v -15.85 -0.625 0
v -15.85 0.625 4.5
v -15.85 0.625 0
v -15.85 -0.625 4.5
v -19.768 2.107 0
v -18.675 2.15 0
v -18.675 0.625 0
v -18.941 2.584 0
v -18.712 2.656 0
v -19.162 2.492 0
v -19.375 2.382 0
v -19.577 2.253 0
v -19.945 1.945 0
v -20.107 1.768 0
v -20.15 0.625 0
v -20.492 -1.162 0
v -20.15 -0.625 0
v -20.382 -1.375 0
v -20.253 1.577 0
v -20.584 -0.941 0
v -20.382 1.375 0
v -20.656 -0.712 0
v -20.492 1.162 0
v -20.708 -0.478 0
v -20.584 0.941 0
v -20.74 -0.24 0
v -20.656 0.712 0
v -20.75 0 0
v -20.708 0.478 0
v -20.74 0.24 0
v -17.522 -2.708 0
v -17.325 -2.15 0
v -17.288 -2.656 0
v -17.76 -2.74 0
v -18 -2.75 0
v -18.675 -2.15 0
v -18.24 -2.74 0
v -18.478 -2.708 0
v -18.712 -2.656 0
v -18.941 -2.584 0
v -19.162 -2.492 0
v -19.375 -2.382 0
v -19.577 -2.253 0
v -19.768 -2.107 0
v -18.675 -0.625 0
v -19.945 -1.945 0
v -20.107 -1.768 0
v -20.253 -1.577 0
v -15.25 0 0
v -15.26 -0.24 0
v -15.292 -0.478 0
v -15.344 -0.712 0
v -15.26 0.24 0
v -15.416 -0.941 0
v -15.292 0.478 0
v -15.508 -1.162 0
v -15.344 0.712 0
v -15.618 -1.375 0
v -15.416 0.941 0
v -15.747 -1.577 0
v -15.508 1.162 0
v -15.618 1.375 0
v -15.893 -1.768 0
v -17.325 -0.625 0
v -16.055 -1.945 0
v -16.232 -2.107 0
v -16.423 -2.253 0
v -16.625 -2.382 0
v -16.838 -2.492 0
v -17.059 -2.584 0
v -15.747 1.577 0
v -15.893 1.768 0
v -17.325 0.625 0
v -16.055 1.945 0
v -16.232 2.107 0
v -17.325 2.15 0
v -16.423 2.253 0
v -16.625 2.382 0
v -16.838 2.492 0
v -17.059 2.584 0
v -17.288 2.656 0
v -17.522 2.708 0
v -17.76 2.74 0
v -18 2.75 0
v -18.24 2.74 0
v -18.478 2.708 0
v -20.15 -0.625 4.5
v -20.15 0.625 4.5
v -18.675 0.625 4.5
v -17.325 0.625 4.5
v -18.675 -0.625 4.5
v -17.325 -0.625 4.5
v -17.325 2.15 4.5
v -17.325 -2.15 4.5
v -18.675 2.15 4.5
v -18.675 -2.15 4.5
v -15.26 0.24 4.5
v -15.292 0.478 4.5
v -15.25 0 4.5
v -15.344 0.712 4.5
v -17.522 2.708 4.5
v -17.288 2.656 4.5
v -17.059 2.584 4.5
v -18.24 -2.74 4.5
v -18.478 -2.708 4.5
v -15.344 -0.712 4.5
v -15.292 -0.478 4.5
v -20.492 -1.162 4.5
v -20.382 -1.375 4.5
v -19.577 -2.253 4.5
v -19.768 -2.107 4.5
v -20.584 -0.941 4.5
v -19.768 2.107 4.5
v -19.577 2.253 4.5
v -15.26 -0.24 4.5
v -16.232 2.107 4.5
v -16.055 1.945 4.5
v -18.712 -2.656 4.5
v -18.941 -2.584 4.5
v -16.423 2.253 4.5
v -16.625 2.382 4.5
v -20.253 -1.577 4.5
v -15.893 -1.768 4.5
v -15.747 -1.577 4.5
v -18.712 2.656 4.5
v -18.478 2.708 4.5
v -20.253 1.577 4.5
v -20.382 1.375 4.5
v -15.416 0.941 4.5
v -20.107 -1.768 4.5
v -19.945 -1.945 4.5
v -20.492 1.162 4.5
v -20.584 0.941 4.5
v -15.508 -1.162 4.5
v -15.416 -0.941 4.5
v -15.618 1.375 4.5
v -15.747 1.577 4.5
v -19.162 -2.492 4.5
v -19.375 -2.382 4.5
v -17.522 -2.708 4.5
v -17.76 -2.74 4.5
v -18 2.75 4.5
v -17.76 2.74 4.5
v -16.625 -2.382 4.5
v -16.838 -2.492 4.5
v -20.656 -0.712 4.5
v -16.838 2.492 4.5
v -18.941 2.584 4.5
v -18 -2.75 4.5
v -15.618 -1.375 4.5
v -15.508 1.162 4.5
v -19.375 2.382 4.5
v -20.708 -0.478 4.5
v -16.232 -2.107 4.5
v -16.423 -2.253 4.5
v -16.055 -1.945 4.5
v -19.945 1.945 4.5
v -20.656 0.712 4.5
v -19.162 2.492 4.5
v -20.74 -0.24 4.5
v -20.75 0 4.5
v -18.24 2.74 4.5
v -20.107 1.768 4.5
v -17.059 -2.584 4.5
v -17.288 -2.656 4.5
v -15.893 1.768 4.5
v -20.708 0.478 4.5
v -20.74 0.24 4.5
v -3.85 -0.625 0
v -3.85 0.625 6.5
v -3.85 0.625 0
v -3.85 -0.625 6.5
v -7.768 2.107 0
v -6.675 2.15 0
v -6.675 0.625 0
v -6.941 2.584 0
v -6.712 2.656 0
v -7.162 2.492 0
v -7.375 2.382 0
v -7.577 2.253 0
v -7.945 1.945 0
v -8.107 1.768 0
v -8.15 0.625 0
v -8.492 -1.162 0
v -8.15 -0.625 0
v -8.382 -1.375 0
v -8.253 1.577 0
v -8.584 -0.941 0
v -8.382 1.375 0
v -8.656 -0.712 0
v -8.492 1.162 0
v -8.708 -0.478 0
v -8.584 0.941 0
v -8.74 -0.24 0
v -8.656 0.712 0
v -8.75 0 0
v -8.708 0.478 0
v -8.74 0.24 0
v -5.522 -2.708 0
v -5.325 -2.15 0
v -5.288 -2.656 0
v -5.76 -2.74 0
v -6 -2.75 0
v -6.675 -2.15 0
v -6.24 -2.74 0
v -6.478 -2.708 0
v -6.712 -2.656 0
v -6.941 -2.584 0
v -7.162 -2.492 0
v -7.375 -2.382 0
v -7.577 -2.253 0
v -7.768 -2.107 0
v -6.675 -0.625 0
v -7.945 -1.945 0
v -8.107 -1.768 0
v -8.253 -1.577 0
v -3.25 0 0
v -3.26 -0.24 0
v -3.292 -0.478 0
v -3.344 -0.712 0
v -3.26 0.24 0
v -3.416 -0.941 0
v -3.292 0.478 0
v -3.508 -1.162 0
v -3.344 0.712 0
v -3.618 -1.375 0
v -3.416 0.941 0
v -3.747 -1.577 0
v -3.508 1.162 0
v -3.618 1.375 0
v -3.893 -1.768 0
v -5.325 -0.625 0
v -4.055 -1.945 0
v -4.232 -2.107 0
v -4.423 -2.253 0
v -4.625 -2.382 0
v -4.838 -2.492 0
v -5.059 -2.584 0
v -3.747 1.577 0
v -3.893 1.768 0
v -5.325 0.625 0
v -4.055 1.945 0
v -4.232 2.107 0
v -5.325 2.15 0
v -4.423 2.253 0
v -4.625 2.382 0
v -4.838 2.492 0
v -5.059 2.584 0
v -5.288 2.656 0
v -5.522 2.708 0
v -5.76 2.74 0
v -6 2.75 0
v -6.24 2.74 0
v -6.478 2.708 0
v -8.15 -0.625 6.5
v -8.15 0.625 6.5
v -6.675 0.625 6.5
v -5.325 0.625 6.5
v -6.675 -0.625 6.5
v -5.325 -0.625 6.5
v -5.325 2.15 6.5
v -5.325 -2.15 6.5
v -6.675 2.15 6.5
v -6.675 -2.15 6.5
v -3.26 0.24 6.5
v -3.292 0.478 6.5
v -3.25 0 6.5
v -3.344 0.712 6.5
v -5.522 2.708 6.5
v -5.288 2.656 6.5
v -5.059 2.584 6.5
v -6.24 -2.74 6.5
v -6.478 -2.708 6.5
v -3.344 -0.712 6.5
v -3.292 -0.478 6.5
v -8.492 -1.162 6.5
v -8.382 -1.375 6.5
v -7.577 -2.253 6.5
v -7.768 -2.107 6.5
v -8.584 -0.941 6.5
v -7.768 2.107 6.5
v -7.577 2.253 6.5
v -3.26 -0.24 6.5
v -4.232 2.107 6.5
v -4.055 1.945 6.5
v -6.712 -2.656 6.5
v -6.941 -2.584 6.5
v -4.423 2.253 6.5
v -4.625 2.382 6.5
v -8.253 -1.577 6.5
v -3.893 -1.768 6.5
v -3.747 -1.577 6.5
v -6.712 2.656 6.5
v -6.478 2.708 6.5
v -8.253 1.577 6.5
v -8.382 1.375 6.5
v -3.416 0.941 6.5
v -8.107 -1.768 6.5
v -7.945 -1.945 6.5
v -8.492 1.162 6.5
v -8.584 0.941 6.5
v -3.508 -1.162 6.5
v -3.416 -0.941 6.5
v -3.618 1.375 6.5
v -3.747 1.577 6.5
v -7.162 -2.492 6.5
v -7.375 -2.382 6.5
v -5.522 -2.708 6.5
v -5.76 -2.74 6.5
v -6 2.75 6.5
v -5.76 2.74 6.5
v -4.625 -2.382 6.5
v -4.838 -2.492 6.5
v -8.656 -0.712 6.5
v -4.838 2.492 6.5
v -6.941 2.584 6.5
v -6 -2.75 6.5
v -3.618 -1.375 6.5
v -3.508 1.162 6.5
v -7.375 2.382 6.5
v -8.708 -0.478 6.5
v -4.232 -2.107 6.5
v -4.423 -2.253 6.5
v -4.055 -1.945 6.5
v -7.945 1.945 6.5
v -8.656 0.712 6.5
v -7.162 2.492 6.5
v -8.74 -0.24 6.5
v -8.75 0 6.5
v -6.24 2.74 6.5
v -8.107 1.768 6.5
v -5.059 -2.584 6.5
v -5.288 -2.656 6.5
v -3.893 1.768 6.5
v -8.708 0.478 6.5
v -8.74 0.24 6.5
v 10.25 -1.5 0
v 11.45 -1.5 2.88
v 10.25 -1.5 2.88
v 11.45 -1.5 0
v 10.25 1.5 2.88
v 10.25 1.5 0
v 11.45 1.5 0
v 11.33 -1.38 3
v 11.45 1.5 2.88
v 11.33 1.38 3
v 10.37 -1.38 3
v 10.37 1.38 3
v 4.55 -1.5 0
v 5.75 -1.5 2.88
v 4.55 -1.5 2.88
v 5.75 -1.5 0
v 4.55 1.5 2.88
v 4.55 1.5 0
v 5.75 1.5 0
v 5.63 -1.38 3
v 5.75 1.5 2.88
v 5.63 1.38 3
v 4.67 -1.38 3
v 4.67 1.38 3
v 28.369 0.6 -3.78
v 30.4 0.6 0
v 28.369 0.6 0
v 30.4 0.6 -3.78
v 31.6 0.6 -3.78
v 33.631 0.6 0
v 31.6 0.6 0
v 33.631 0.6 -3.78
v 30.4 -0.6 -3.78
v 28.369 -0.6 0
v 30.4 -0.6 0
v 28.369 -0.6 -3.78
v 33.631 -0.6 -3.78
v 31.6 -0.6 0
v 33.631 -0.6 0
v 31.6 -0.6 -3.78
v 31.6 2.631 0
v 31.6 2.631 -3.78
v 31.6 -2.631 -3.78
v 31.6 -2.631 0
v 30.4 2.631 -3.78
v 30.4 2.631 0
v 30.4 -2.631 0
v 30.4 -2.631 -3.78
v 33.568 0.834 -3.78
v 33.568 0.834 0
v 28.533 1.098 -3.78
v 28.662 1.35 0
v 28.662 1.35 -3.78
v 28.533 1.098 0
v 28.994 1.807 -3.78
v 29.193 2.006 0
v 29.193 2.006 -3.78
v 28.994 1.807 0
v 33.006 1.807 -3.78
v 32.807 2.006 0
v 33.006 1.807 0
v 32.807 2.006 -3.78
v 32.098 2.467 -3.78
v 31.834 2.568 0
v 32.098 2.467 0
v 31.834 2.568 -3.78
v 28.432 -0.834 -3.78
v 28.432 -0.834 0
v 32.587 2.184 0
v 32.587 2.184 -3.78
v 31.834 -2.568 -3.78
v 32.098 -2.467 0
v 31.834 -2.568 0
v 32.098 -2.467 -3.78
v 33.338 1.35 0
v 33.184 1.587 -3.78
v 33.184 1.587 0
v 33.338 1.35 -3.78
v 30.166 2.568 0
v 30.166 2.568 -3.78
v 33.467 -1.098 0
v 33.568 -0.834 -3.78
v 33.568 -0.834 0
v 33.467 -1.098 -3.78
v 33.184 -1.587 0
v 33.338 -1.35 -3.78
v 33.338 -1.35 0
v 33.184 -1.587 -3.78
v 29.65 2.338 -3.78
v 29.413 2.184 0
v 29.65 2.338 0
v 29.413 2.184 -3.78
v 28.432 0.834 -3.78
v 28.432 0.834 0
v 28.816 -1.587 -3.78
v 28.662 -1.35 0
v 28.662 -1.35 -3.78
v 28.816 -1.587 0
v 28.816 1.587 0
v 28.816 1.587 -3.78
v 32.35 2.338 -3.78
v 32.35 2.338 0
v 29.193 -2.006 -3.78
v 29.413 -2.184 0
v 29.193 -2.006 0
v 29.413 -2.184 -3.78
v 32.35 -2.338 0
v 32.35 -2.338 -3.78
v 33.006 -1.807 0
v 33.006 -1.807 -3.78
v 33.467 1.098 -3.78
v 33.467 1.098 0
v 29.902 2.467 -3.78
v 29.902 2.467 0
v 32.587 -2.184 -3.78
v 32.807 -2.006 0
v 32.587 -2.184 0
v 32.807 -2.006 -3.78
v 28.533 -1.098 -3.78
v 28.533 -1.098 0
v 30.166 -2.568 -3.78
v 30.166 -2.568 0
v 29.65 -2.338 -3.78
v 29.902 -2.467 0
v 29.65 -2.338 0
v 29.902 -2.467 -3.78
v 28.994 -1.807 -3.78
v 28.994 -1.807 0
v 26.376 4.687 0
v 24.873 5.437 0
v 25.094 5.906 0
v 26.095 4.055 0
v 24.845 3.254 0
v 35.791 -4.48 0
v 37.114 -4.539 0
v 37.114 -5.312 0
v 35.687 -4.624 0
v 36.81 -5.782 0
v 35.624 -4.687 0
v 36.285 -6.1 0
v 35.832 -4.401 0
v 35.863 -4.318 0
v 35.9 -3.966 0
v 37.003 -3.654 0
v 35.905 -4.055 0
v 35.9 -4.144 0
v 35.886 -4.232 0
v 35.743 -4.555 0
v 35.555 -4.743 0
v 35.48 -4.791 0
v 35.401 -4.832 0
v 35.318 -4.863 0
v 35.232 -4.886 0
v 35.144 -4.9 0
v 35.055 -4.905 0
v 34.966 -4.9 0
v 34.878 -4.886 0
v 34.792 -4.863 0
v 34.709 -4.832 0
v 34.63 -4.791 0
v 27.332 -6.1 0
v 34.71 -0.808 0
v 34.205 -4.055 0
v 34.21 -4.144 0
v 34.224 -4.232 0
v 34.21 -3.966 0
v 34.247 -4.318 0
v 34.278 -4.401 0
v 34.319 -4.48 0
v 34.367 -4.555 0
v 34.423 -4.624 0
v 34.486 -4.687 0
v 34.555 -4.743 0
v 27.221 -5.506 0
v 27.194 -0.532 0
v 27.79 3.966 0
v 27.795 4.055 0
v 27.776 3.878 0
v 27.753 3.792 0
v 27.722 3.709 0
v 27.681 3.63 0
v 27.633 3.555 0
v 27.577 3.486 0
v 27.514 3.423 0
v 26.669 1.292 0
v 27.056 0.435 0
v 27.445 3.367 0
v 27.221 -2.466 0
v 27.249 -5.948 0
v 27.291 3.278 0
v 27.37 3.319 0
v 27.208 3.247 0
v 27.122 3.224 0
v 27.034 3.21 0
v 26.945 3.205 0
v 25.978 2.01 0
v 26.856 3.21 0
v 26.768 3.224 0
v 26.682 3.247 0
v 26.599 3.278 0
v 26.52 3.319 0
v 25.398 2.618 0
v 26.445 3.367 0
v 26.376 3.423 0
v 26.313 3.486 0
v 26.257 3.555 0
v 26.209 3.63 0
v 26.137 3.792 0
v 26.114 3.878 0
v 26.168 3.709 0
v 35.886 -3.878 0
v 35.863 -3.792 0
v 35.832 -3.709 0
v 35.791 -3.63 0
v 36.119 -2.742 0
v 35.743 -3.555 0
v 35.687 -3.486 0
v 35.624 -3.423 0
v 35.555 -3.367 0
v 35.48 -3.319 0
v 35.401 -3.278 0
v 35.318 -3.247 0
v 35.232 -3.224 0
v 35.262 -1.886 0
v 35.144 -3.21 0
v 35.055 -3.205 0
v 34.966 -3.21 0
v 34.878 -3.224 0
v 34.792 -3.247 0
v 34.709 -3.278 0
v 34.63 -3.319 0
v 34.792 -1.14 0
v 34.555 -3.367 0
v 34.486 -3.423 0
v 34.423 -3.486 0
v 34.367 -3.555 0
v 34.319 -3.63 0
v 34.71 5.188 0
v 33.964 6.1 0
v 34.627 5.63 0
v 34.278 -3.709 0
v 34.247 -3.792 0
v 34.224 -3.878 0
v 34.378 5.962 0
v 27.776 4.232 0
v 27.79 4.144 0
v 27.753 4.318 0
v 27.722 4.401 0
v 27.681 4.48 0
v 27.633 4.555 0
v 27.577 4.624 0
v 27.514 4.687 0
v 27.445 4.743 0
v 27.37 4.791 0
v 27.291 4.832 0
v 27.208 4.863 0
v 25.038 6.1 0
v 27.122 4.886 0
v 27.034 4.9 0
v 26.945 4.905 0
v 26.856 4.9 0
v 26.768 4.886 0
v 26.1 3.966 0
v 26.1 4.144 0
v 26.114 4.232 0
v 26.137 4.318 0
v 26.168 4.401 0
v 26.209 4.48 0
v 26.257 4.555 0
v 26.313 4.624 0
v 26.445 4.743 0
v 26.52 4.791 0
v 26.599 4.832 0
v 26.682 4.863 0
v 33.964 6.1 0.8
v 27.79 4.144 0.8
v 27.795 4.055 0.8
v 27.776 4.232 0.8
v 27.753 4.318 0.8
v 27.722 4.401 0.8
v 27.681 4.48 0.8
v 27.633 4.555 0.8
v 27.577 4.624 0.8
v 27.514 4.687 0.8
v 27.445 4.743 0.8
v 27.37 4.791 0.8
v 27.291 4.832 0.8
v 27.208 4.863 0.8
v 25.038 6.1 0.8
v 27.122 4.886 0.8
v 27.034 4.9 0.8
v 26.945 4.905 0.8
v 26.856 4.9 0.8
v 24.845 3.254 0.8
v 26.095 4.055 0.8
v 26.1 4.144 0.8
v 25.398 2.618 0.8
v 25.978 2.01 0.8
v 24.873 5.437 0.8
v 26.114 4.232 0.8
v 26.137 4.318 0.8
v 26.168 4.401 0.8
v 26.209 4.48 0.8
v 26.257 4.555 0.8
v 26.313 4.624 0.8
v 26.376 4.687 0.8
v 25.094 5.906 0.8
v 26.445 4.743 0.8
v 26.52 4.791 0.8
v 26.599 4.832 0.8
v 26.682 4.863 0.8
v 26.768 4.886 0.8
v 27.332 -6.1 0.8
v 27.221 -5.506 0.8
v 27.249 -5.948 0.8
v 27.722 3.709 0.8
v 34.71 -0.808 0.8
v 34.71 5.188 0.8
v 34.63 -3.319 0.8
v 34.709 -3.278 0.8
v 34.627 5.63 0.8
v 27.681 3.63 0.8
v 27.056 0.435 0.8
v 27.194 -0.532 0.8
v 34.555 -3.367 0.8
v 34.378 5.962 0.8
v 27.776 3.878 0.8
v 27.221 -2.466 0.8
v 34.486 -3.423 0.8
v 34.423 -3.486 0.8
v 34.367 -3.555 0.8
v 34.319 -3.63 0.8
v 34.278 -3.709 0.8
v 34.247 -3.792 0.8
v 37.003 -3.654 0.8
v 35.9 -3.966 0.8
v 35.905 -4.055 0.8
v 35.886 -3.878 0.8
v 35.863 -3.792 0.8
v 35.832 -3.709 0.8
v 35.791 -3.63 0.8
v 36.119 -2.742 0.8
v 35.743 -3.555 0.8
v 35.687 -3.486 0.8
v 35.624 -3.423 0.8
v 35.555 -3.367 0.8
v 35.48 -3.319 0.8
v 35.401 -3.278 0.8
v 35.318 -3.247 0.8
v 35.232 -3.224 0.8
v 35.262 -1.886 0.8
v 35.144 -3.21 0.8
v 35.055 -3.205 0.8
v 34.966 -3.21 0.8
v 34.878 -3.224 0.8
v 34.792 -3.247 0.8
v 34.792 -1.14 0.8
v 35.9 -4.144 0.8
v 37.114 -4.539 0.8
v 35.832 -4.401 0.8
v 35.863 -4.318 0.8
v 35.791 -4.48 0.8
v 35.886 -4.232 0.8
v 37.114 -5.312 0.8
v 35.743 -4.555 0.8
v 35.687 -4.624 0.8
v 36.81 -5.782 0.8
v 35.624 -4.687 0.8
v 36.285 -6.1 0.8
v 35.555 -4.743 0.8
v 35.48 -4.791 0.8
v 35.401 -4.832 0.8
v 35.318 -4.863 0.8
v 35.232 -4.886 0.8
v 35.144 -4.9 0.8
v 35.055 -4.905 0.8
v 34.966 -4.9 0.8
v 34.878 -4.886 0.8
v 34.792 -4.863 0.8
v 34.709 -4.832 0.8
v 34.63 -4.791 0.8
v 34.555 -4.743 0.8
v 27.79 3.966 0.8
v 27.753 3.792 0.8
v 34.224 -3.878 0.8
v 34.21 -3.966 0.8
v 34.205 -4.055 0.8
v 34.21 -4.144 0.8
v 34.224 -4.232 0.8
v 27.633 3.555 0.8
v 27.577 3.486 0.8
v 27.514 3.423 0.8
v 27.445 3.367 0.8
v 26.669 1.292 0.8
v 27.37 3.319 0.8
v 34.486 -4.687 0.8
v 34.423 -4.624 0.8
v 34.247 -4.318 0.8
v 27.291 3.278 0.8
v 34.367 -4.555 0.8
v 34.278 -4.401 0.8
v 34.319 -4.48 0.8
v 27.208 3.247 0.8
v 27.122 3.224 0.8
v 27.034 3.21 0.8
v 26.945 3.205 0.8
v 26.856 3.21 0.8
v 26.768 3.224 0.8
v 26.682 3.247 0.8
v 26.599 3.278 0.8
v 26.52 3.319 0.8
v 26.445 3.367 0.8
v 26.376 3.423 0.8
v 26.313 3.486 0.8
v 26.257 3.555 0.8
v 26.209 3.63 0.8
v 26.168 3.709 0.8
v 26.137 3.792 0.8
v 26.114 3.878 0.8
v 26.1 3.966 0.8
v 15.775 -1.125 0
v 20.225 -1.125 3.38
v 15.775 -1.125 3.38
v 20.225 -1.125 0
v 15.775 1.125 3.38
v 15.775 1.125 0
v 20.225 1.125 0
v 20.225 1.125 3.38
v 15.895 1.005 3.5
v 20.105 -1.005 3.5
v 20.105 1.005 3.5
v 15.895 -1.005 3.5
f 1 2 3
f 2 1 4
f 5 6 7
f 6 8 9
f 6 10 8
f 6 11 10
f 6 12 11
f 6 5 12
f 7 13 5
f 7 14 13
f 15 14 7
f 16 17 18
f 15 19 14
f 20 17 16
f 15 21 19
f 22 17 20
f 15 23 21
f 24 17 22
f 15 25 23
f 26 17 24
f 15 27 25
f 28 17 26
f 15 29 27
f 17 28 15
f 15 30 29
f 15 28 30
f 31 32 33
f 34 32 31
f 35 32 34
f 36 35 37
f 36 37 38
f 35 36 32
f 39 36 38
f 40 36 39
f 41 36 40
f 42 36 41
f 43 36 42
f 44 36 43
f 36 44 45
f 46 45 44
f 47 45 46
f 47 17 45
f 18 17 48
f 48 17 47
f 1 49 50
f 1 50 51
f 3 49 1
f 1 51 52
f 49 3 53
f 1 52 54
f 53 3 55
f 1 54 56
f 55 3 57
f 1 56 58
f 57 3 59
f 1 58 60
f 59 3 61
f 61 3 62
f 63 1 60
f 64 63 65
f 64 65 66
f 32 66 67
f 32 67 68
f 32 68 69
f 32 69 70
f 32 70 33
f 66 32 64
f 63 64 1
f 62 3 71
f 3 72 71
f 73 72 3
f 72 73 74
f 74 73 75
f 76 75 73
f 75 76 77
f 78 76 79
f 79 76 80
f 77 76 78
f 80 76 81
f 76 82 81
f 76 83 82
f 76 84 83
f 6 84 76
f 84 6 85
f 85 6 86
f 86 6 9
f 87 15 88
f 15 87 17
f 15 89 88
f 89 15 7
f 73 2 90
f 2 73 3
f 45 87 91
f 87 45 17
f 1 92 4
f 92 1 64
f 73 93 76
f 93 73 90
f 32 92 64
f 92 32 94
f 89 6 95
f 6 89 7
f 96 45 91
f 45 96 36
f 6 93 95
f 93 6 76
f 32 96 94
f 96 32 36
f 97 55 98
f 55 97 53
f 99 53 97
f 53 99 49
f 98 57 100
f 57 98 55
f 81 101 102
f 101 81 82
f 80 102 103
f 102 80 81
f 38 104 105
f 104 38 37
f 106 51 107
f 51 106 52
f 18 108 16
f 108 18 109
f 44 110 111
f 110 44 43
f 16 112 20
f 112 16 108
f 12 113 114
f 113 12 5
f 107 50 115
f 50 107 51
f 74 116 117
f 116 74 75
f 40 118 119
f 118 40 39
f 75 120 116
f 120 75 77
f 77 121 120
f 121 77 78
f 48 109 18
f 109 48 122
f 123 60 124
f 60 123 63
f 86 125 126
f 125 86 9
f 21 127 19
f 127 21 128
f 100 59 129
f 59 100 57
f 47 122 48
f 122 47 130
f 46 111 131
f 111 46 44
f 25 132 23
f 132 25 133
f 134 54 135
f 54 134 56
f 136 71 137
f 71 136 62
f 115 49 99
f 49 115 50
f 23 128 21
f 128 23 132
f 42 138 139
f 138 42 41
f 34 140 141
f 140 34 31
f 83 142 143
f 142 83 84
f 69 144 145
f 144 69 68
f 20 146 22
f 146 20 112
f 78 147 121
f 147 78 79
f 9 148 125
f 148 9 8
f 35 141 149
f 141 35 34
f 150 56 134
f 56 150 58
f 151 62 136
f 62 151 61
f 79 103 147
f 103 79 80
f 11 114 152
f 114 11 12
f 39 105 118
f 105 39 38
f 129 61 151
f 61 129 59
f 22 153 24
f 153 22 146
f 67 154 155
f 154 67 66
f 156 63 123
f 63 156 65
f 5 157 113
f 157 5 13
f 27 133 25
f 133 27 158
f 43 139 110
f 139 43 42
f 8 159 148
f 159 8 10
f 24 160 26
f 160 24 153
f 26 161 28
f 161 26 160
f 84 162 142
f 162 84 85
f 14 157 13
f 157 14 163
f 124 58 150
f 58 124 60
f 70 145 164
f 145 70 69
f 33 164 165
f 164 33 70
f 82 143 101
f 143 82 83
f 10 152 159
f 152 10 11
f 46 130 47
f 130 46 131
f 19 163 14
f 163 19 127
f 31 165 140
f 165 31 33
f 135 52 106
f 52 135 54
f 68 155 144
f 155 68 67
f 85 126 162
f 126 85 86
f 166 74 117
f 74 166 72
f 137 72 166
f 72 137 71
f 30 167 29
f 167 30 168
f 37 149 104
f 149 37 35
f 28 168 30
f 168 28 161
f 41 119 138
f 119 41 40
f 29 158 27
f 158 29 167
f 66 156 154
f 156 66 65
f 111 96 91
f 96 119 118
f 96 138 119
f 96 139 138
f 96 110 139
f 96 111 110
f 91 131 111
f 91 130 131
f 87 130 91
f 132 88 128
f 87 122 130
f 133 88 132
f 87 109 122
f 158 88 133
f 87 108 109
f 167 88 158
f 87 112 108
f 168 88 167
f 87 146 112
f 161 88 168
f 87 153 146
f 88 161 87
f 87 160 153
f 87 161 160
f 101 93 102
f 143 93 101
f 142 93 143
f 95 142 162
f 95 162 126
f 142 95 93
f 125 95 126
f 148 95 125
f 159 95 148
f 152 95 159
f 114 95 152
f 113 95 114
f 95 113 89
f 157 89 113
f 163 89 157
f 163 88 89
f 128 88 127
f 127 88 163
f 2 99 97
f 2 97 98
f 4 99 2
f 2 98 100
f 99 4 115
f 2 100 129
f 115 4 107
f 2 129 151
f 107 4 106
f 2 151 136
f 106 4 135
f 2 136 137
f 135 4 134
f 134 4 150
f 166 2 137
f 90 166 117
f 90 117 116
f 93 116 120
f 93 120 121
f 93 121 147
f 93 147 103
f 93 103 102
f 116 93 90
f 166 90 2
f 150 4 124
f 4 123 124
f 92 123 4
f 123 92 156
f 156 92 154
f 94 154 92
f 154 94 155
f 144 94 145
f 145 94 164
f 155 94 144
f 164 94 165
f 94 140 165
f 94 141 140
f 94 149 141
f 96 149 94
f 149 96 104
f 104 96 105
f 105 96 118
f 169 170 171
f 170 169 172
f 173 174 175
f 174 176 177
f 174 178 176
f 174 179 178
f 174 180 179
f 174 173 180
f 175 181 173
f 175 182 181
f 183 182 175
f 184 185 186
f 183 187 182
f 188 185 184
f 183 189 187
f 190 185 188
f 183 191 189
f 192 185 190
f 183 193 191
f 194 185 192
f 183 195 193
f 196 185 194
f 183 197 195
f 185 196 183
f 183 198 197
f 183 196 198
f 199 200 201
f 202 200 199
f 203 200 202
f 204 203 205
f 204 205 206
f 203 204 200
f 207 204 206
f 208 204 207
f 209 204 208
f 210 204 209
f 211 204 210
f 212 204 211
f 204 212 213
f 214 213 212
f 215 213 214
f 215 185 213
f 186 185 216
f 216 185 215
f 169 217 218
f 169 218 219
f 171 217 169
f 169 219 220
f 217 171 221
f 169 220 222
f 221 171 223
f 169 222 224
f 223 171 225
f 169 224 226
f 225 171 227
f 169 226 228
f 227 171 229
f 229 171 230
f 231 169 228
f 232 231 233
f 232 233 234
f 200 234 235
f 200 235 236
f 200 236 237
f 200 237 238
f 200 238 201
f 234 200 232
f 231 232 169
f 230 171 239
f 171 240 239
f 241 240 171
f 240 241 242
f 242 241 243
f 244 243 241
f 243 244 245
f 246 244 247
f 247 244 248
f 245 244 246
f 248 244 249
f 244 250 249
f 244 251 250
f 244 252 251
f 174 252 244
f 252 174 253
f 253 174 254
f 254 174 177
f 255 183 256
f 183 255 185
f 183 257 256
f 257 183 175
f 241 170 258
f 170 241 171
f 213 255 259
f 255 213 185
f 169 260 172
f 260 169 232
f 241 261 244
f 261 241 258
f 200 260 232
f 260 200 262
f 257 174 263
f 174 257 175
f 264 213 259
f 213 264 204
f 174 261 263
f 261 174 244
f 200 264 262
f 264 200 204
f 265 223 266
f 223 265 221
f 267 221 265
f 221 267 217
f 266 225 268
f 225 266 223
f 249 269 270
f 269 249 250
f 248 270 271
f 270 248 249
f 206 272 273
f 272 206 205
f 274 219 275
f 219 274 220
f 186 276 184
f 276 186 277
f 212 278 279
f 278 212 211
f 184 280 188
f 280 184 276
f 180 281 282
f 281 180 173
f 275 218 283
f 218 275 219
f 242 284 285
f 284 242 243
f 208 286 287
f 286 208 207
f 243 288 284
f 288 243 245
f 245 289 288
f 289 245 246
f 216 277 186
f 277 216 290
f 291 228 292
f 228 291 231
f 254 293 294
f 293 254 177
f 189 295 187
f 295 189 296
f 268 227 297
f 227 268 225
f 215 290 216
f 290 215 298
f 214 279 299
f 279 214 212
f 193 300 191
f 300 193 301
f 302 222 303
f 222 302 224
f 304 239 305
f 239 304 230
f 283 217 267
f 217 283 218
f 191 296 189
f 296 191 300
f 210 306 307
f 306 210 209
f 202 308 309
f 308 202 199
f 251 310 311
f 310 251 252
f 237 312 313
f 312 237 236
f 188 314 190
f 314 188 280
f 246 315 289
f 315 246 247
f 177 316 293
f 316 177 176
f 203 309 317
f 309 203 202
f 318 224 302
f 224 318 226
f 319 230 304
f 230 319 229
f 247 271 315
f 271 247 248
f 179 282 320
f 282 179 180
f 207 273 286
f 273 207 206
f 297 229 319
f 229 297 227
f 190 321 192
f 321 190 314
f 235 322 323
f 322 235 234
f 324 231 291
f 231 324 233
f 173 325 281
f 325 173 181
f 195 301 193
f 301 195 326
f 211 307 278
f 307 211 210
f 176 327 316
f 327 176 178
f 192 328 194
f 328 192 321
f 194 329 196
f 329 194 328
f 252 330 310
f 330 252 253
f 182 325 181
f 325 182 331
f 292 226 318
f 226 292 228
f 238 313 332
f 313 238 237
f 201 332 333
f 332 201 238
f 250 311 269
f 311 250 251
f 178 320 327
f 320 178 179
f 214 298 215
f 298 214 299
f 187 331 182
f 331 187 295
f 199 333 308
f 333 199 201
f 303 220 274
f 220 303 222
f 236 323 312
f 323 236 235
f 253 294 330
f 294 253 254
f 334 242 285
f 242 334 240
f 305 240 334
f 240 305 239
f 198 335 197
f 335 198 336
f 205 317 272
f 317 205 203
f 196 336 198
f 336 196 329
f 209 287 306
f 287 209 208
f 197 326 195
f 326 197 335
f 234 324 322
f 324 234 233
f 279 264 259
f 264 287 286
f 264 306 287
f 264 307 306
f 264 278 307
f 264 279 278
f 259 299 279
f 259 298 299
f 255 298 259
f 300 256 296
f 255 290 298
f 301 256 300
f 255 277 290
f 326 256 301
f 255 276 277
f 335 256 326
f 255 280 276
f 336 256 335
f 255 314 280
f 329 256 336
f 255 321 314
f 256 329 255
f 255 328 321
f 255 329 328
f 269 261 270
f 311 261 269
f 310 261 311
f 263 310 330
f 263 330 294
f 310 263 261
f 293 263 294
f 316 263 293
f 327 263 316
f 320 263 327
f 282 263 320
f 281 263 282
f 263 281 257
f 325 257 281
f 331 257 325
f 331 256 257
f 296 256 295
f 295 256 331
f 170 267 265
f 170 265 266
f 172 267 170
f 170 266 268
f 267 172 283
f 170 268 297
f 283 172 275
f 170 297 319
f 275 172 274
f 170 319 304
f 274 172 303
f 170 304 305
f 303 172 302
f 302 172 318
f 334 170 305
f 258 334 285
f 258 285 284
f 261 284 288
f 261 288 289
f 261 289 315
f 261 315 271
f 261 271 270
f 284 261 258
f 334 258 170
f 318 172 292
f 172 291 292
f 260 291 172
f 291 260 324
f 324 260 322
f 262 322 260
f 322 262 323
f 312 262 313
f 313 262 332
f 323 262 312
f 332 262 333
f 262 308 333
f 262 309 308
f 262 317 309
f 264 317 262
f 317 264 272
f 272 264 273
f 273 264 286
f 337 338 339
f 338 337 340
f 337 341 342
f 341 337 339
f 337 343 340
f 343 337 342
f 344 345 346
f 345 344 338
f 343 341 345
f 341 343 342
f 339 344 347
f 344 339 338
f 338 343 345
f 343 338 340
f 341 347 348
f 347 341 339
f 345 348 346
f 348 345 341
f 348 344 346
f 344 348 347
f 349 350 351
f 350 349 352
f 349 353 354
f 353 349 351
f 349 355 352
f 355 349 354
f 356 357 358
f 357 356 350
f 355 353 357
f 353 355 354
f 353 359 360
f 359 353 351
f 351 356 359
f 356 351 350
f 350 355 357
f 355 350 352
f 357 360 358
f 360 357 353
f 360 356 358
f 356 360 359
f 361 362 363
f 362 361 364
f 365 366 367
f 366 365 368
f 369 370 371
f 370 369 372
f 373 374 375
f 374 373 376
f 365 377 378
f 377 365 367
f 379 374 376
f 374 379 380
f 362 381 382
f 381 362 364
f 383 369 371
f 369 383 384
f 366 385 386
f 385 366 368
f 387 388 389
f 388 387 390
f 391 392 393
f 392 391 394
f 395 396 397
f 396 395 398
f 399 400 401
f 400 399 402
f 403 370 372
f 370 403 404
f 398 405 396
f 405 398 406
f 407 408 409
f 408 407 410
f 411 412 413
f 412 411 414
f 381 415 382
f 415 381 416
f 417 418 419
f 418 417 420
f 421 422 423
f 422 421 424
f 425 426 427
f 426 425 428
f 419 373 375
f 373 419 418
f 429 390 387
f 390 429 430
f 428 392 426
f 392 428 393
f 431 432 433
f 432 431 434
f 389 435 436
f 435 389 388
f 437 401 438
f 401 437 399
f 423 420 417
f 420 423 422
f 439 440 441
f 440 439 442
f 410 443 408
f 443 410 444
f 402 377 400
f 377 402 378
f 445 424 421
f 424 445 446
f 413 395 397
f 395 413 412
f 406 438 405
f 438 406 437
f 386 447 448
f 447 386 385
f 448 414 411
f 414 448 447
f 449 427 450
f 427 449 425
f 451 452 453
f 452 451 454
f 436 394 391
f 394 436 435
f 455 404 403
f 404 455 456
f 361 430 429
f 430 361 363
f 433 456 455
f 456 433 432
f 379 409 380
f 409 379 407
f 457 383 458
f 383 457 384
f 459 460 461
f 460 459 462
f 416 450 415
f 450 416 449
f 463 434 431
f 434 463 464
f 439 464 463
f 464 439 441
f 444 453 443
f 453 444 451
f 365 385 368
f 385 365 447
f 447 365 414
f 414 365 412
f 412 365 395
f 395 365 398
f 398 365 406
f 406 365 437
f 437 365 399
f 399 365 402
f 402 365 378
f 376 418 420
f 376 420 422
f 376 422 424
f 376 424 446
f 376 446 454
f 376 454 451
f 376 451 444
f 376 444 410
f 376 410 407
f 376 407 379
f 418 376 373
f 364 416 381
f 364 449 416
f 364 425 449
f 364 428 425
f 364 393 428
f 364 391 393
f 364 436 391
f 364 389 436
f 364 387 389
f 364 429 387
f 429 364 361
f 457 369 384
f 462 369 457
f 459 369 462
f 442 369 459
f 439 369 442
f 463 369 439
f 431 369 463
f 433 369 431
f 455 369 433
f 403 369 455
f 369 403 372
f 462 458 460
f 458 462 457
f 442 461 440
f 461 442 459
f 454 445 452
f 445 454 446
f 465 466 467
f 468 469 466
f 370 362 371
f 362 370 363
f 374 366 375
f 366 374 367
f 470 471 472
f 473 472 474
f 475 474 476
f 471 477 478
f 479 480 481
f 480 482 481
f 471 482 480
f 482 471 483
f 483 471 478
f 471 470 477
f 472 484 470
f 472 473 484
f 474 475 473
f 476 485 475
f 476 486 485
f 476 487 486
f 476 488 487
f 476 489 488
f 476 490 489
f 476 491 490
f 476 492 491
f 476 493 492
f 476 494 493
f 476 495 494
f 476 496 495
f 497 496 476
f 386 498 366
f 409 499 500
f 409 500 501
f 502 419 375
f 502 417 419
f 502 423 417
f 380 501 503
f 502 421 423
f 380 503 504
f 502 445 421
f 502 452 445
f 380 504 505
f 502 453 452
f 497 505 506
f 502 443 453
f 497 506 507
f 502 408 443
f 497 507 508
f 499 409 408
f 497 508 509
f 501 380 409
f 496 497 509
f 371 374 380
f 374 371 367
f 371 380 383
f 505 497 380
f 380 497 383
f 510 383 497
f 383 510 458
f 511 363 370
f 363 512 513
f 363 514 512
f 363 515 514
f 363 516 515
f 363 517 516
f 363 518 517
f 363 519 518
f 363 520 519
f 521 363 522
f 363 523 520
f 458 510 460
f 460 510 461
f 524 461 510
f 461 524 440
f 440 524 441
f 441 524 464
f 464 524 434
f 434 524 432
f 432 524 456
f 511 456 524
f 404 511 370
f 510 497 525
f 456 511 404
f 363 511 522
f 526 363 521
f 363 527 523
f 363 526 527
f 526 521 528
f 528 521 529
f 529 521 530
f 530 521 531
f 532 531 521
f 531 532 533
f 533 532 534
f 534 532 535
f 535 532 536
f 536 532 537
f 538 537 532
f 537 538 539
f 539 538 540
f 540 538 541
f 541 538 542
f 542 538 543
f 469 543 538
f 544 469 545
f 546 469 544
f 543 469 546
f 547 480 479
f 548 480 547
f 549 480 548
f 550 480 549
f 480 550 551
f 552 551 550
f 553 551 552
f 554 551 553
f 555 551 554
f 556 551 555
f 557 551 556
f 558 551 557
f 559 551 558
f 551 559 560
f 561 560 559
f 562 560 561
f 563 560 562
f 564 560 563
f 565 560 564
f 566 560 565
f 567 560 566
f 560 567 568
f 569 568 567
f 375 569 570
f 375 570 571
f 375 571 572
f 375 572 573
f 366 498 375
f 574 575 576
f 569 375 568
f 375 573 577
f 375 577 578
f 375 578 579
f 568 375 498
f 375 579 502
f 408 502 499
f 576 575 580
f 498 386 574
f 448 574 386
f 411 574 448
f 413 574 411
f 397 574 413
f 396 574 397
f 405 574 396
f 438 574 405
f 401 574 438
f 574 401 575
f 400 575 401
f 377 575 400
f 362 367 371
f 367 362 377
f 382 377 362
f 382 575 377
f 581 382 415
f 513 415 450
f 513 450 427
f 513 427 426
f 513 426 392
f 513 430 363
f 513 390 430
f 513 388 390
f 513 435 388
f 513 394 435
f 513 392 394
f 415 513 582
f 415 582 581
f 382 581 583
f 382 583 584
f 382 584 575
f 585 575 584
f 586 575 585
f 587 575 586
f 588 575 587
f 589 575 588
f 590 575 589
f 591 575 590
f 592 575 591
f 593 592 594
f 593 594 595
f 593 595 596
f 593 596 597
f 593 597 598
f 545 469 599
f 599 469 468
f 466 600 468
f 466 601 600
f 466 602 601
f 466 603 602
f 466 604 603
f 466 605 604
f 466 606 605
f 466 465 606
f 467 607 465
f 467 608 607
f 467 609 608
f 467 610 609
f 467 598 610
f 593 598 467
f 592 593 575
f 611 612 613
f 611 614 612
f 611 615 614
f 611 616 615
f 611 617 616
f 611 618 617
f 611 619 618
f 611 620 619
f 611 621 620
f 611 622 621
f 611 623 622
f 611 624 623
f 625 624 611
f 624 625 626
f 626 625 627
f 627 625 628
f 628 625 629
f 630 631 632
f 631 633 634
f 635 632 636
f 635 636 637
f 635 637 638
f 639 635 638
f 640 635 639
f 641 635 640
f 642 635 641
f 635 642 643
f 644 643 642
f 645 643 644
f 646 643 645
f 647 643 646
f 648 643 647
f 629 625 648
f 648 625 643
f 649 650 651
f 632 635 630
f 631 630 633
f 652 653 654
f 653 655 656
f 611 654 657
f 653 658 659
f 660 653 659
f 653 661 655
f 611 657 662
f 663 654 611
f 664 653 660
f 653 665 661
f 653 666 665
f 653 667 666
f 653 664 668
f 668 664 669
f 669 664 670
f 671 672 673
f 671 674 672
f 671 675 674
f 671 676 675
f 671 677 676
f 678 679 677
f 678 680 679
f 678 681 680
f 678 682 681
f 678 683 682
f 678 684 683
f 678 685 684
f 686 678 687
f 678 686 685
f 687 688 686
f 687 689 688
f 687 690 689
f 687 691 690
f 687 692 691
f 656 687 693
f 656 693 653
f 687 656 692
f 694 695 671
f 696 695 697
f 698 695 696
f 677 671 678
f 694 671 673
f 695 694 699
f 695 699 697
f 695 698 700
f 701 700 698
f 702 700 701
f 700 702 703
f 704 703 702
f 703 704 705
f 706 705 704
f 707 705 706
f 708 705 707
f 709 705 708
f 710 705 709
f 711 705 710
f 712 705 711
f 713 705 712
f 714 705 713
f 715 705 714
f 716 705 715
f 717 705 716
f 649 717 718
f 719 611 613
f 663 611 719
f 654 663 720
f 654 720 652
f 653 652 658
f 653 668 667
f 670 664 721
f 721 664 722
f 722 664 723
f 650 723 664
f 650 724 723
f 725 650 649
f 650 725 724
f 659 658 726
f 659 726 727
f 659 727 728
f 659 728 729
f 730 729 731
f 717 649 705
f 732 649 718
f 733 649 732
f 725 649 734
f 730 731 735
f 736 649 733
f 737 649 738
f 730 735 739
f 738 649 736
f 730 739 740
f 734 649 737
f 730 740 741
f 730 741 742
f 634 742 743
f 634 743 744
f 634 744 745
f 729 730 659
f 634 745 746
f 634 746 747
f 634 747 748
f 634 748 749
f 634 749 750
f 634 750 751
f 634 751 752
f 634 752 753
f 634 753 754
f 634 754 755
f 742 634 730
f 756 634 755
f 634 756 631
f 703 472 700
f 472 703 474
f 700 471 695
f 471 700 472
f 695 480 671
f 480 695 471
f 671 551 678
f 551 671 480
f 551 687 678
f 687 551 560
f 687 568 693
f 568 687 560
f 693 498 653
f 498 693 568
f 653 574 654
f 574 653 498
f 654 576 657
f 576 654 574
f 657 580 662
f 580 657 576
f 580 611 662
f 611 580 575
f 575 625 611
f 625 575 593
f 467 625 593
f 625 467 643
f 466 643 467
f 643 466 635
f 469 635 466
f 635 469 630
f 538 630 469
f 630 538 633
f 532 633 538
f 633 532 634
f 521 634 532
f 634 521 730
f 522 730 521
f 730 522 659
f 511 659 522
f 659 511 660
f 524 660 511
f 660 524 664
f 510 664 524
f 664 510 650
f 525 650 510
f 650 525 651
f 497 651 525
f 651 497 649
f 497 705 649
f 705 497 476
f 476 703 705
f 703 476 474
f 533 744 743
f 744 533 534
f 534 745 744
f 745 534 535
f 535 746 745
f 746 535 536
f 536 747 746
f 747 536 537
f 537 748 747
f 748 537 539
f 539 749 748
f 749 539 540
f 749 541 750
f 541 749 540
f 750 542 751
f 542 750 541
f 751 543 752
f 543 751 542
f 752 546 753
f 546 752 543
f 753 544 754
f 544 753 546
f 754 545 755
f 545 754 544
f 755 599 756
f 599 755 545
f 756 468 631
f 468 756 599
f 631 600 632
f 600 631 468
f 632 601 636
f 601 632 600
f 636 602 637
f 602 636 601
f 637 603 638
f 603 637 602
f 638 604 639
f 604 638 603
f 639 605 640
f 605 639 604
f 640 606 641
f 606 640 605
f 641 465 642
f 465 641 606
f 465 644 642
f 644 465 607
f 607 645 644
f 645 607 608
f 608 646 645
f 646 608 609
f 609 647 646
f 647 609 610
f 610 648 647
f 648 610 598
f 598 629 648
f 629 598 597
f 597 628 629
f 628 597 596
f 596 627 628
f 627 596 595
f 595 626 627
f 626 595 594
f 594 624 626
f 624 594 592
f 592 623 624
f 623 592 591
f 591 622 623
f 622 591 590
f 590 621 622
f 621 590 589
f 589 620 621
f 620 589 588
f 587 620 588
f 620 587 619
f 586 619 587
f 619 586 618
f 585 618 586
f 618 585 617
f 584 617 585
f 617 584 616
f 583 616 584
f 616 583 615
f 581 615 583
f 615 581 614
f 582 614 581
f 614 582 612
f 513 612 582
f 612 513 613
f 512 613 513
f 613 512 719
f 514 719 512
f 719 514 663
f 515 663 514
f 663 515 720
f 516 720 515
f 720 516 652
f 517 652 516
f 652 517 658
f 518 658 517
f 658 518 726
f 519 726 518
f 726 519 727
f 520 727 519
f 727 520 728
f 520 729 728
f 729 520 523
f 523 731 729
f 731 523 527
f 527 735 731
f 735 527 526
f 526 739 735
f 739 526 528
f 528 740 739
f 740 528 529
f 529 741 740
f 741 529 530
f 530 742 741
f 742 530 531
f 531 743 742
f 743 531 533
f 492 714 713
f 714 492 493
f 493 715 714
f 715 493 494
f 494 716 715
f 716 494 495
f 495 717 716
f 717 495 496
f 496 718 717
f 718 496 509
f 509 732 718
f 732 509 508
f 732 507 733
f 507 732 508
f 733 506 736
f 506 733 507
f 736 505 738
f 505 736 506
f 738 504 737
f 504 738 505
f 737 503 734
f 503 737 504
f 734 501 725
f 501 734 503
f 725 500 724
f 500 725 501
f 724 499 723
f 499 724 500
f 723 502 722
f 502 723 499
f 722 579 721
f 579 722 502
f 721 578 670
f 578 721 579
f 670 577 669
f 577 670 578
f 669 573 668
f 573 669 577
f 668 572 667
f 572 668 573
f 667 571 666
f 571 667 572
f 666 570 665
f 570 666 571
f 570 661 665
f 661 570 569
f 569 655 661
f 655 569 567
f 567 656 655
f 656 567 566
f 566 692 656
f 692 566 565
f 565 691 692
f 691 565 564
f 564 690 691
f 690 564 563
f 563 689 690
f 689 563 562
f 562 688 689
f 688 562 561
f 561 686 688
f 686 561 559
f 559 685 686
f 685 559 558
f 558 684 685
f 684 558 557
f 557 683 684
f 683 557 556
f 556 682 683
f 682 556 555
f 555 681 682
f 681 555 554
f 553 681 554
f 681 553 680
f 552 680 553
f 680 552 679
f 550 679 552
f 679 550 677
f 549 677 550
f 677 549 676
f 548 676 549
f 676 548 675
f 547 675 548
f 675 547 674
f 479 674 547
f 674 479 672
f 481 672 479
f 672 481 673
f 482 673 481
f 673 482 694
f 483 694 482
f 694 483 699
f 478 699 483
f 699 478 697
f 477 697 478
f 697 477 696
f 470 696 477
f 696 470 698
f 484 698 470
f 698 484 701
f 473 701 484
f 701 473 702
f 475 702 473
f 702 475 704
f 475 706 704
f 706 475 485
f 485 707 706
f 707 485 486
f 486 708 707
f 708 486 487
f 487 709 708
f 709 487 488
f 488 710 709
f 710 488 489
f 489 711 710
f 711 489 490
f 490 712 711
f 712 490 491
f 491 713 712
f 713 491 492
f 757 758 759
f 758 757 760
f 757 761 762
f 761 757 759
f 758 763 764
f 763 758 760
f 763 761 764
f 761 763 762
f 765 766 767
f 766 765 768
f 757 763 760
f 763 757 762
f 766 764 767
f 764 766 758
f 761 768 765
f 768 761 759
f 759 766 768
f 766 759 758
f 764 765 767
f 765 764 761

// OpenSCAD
// file: ../modules/stem_j_stem_lp01.scad
function j_stem_lp01_curve_steps(
    diameter,
    quality = "export",
    preview_angle = 12,
    export_angle = 6,
    preview_chord = 0.7,
    export_chord = 0.3,
    minimum_steps = 12,
    preview_max_steps = 40,
    export_max_steps = 72
) =
    let(
        safe_radius = max(diameter / 2, 0.01),
        max_angle = quality == "preview" ? preview_angle : export_angle,
        max_chord = quality == "preview" ? preview_chord : export_chord,
        max_steps = quality == "preview" ? preview_max_steps : export_max_steps,
        angle_steps = ceil(360 / max(max_angle, 0.1)),
        chord_steps = ceil(2 * PI * safe_radius / max(max_chord, 0.01))
    )
    min(max(max(angle_steps, chord_steps), minimum_steps), max_steps);

function j_stem_lp01_scale_point(point, hole_pitch_x = 8.11, plate_height = 12.2) =
    [point[0] * hole_pitch_x / 8.11, point[1] * plate_height / 12.2];

function j_stem_lp01_plate_outline_points(hole_pitch_x = 8.11, plate_height = 12.2) =
    let(
        source_points = [
            [-5.962,  6.100],
            [ 2.964,  6.100],
            [ 3.378,  5.962],
            [ 3.627,  5.630],
            [ 3.710,  5.188],
            [ 3.710, -0.808],
            [ 3.792, -1.140],
            [ 4.262, -1.886],
            [ 5.119, -2.742],
            [ 6.003, -3.654],
            [ 6.114, -4.539],
            [ 6.114, -5.312],
            [ 5.810, -5.782],
            [ 5.285, -6.100],
            [-3.668, -6.100],
            [-3.751, -5.948],
            [-3.779, -5.506],
            [-3.779, -2.466],
            [-3.806, -0.532],
            [-3.944,  0.435],
            [-4.331,  1.292],
            [-5.022,  2.010],
            [-5.602,  2.618],
            [-6.155,  3.254],
            [-6.127,  5.437],
            [-5.906,  5.906]
        ]
    )
    [for (point = source_points) j_stem_lp01_scale_point(point, hole_pitch_x, plate_height)];

module j_stem_lp01_plate_outline_2d(
    hole_pitch_x = 8.11,
    plate_height = 12.2,
    clearance = 0,
    quality = "export"
) {
    safe_clearance = max(clearance, -0.3);

    offset(delta = safe_clearance)
        polygon(points = j_stem_lp01_plate_outline_points(hole_pitch_x, plate_height));
}

module j_stem_lp01_mount_holes_2d(
    hole_pitch_x = 8.11,
    hole_pitch_y = 8.11,
    hole_diameter = 1.7,
    quality = "export"
) {
    hole_steps = j_stem_lp01_curve_steps(hole_diameter, quality);

    for (position = [[-hole_pitch_x / 2, hole_pitch_y / 2], [hole_pitch_x / 2, -hole_pitch_y / 2]]) {
        translate(position)
            circle(d = hole_diameter, $fn = hole_steps);
    }
}

module j_stem_lp01_plate_top_2d(
    hole_pitch_x = 8.11,
    plate_height = 12.2,
    hole_pitch_y = 8.11,
    hole_diameter = 1.7,
    clearance = 0,
    include_holes = true,
    quality = "export"
) {
    if (include_holes) {
        difference() {
            j_stem_lp01_plate_outline_2d(hole_pitch_x, plate_height, clearance, quality);
            j_stem_lp01_mount_holes_2d(
                hole_pitch_x = hole_pitch_x,
                hole_pitch_y = hole_pitch_y,
                hole_diameter = hole_diameter,
                quality = quality
            );
        }
    } else {
        j_stem_lp01_plate_outline_2d(hole_pitch_x, plate_height, clearance, quality);
    }
}

module j_stem_lp01_cross_slot(length, width, height) {
    translate([-length / 2, -width / 2, 0])
        cube([length, width, height]);
}

module j_stem_lp01_mx_socket_cut(
    height,
    cross_width_horizontal = 1.2,
    cross_length_horizontal = 5.4,
    cross_width_vertical = 1.2,
    cross_length_vertical = 5.4,
    z = 0
) {
    translate([0, 0, z]) {
        j_stem_lp01_cross_slot(cross_length_horizontal, cross_width_horizontal, height);
        j_stem_lp01_cross_slot(cross_width_vertical, cross_length_vertical, height);
    }
}

module j_stem_lp01_switch_socket_post(
    post_diameter = 5.4,
    post_height = 3.78,
    cross_width_horizontal = 1.2,
    cross_width_vertical = 1.2,
    quality = "export"
) {
    post_steps = j_stem_lp01_curve_steps(post_diameter, quality);

    difference() {
        translate([0, 0, 0])
            cylinder(d = post_diameter, h = post_height, $fn = post_steps);

        j_stem_lp01_mx_socket_cut(
            post_height + 0.04,
            cross_width_horizontal = cross_width_horizontal,
            cross_length_horizontal = post_diameter,
            cross_width_vertical = cross_width_vertical,
            cross_length_vertical = post_diameter,
            z = -0.02
        );
    }
}

module j_stem_lp01_receiver_recess(
    hole_pitch_x = 8.11,
    plate_height = 12.2,
    hole_pitch_y = 8.11,
    hole_diameter = 1.7,
    height = 1,
    clearance = 0,
    quality = "export"
) {
    safe_height = max(height, 0.01);

    linear_extrude(height = safe_height)
        j_stem_lp01_plate_top_2d(
            hole_pitch_x = hole_pitch_x,
            plate_height = plate_height,
            hole_pitch_y = hole_pitch_y,
            hole_diameter = hole_diameter,
            clearance = clearance,
            include_holes = true,
            quality = quality
        );
}

module j_stem_lp01_model(
    hole_pitch_x = 8.11,
    plate_height = 12.2,
    plate_thickness = 0.8,
    hole_pitch_y = 8.11,
    hole_diameter = 1.7,
    post_diameter = 5.4,
    post_height = 3.78,
    cross_width_horizontal = 1.2,
    cross_width_vertical = 1.2,
    quality = "export"
) {
    post_mount_overlap = 0.02;

    union() {
        linear_extrude(height = plate_thickness)
            j_stem_lp01_plate_top_2d(
                hole_pitch_x = hole_pitch_x,
                plate_height = plate_height,
                hole_pitch_y = hole_pitch_y,
                hole_diameter = hole_diameter,
                include_holes = true,
                quality = quality
            );

        // The plate occupies the keycap-side receiver; the socket post points outward toward the switch.
        translate([0, 0, -post_height])
            j_stem_lp01_switch_socket_post(
                post_diameter = post_diameter,
                post_height = post_height + post_mount_overlap,
                cross_width_horizontal = cross_width_horizontal,
                cross_width_vertical = cross_width_vertical,
                quality = quality
            );
    }
}
// file: ../modules/stem_alps.scad
function positive_alps_stem_dimension(value, minimum = 0.1) = max(value, minimum);

module alps_post(stem_length, stem_width, stem_height, lead_in) {
    safe_length = positive_alps_stem_dimension(stem_length);
    safe_width = positive_alps_stem_dimension(stem_width);
    safe_height = max(stem_height, 0.2);
    safe_lead_in = min(lead_in, safe_length * 0.2, safe_width * 0.3, safe_height * 0.4);

    hull() {
        linear_extrude(height = max(safe_height - safe_lead_in, 0.01))
            square([safe_length, safe_width], center = true);

        translate([0, 0, safe_height - 0.01])
            linear_extrude(height = 0.01)
                square([
                    positive_alps_stem_dimension(safe_length - safe_lead_in * 2),
                    positive_alps_stem_dimension(safe_width - safe_lead_in * 2)
                ], center = true);
    }
}

module stem_alps(
    stem_length = 4.45,
    stem_width = 2.25,
    stem_height = 3.5,
    base_clearance = 0,
    lead_in = 0.12,
    quality = "export"
) {
    translate([0, 0, base_clearance])
        alps_post(stem_length, stem_width, stem_height, lead_in);
}
// file: ../modules/stem_choc_v2.scad
use <stem_mx.scad>

module stem_choc_v2(
    outer_diameter = 5.5,
    stem_height = 6.5,
    base_clearance = 0,
    cross_width_horizontal = 1.25,
    cross_length_horizontal = 4.3,
    cross_width_vertical = 1.35,
    cross_length_vertical = 4.3,
    cross_chamfer = 0,
    chamfer_height = 0.6,
    quality = "export"
) {
    stem_mx(
        outer_diameter = outer_diameter,
        stem_height = stem_height,
        base_clearance = base_clearance,
        cross_width_horizontal = cross_width_horizontal,
        cross_length_horizontal = cross_length_horizontal,
        cross_width_vertical = cross_width_vertical,
        cross_length_vertical = cross_length_vertical,
        cross_chamfer = cross_chamfer,
        chamfer_height = chamfer_height,
        quality = quality
    );
}
// file: ../modules/stem_choc_v1.scad
function positive_choc_stem_dimension(value, minimum = 0.1) = max(value, minimum);

module choc_v1_prong(prong_width, prong_depth, prong_height, lead_in) {
    safe_width = positive_choc_stem_dimension(prong_width);
    safe_depth = positive_choc_stem_dimension(prong_depth);
    safe_height = max(prong_height, 0.2);
    safe_lead_in = min(lead_in, safe_width * 0.4, safe_depth * 0.2, safe_height * 0.4);

    hull() {
        linear_extrude(height = max(safe_height - safe_lead_in, 0.01))
            square([safe_width, safe_depth], center = true);

        translate([0, 0, safe_height - 0.01])
            linear_extrude(height = 0.01)
                square([
                    positive_choc_stem_dimension(safe_width - safe_lead_in * 2),
                    positive_choc_stem_dimension(safe_depth - safe_lead_in * 2)
                ], center = true);
    }
}

module stem_choc_v1(
    prong_width = 1.2,
    prong_depth = 3.0,
    prong_spacing = 5.7,
    stem_height = 3.0,
    base_clearance = 0,
    lead_in = 0.12,
    quality = "export"
) {
    for (offset_x = [prong_spacing / 2, -prong_spacing / 2]) {
        translate([offset_x, 0, base_clearance])
            choc_v1_prong(prong_width, prong_depth, stem_height, lead_in);
    }
}
// file: ../modules/stem_mx.scad
function stem_curve_steps(
    diameter,
    quality = "export",
    preview_angle = 10,
    export_angle = 5,
    preview_chord = 0.6,
    export_chord = 0.25,
    minimum_steps = 24,
    preview_max_steps = 48,
    export_max_steps = 96
) =
    let(
        safe_radius = max(diameter / 2, 0.01),
        max_angle = quality == "preview" ? preview_angle : export_angle,
        max_chord = quality == "preview" ? preview_chord : export_chord,
        max_steps = quality == "preview" ? preview_max_steps : export_max_steps,
        angle_steps = ceil(360 / max(max_angle, 0.1)),
        chord_steps = ceil(2 * PI * safe_radius / max(max_chord, 0.01))
    )
    min(max(max(angle_steps, chord_steps), minimum_steps), max_steps);

module stem_slot(length, width, height) {
    translate([-length / 2, -width / 2, 0])
        cube([length, width, height]);
}

module stem_mx(
    outer_diameter = 5.5,
    stem_height = 4.5,
    base_clearance = 0,
    cross_width_horizontal = 1.25,
    cross_length_horizontal = 4.3,
    cross_width_vertical = 1.35,
    cross_length_vertical = 4.3,
    cross_chamfer = 0,
    chamfer_height = 0.6,
    quality = "export"
) {
    outer_steps = stem_curve_steps(outer_diameter, quality);
    safe_height = max(stem_height, 0.2);

    difference() {
        translate([0, 0, base_clearance])
            cylinder(d = outer_diameter, h = safe_height, $fn = outer_steps);

        translate([0, 0, base_clearance]) {
            stem_slot(cross_length_horizontal, cross_width_horizontal, safe_height + 1);
            stem_slot(cross_width_vertical, cross_length_vertical, safe_height + 1);
        }

        if (cross_chamfer > 0) {
            translate([0, 0, base_clearance - 0.01])
                hull() {
                    stem_slot(
                        cross_length_horizontal + cross_chamfer * 2,
                        cross_width_horizontal + cross_chamfer * 2,
                        0.01
                    );
                    translate([0, 0, chamfer_height])
                        stem_slot(cross_length_horizontal, cross_width_horizontal, 0.01);
                }

            translate([0, 0, base_clearance - 0.01])
                hull() {
                    stem_slot(
                        cross_width_vertical + cross_chamfer * 2,
                        cross_length_vertical + cross_chamfer * 2,
                        0.01
                    );
                    translate([0, 0, chamfer_height])
                        stem_slot(cross_width_vertical, cross_length_vertical, 0.01);
                }
        }
    }
}
// main file
use <../modules/stem_mx.scad>
use <../modules/stem_choc_v1.scad>
use <../modules/stem_choc_v2.scad>
use <../modules/stem_alps.scad>
use <../modules/stem_j_stem_lp01.scad>

translate([-18, 0, 0])
    stem_mx();

translate([-6, 0, 0])
    stem_choc_v2(stem_height = 6.5);

translate([8, 0, 0])
    stem_choc_v1();

translate([18, 0, 0])
    stem_alps();

translate([31, 0, 0])
    j_stem_lp01_model();
